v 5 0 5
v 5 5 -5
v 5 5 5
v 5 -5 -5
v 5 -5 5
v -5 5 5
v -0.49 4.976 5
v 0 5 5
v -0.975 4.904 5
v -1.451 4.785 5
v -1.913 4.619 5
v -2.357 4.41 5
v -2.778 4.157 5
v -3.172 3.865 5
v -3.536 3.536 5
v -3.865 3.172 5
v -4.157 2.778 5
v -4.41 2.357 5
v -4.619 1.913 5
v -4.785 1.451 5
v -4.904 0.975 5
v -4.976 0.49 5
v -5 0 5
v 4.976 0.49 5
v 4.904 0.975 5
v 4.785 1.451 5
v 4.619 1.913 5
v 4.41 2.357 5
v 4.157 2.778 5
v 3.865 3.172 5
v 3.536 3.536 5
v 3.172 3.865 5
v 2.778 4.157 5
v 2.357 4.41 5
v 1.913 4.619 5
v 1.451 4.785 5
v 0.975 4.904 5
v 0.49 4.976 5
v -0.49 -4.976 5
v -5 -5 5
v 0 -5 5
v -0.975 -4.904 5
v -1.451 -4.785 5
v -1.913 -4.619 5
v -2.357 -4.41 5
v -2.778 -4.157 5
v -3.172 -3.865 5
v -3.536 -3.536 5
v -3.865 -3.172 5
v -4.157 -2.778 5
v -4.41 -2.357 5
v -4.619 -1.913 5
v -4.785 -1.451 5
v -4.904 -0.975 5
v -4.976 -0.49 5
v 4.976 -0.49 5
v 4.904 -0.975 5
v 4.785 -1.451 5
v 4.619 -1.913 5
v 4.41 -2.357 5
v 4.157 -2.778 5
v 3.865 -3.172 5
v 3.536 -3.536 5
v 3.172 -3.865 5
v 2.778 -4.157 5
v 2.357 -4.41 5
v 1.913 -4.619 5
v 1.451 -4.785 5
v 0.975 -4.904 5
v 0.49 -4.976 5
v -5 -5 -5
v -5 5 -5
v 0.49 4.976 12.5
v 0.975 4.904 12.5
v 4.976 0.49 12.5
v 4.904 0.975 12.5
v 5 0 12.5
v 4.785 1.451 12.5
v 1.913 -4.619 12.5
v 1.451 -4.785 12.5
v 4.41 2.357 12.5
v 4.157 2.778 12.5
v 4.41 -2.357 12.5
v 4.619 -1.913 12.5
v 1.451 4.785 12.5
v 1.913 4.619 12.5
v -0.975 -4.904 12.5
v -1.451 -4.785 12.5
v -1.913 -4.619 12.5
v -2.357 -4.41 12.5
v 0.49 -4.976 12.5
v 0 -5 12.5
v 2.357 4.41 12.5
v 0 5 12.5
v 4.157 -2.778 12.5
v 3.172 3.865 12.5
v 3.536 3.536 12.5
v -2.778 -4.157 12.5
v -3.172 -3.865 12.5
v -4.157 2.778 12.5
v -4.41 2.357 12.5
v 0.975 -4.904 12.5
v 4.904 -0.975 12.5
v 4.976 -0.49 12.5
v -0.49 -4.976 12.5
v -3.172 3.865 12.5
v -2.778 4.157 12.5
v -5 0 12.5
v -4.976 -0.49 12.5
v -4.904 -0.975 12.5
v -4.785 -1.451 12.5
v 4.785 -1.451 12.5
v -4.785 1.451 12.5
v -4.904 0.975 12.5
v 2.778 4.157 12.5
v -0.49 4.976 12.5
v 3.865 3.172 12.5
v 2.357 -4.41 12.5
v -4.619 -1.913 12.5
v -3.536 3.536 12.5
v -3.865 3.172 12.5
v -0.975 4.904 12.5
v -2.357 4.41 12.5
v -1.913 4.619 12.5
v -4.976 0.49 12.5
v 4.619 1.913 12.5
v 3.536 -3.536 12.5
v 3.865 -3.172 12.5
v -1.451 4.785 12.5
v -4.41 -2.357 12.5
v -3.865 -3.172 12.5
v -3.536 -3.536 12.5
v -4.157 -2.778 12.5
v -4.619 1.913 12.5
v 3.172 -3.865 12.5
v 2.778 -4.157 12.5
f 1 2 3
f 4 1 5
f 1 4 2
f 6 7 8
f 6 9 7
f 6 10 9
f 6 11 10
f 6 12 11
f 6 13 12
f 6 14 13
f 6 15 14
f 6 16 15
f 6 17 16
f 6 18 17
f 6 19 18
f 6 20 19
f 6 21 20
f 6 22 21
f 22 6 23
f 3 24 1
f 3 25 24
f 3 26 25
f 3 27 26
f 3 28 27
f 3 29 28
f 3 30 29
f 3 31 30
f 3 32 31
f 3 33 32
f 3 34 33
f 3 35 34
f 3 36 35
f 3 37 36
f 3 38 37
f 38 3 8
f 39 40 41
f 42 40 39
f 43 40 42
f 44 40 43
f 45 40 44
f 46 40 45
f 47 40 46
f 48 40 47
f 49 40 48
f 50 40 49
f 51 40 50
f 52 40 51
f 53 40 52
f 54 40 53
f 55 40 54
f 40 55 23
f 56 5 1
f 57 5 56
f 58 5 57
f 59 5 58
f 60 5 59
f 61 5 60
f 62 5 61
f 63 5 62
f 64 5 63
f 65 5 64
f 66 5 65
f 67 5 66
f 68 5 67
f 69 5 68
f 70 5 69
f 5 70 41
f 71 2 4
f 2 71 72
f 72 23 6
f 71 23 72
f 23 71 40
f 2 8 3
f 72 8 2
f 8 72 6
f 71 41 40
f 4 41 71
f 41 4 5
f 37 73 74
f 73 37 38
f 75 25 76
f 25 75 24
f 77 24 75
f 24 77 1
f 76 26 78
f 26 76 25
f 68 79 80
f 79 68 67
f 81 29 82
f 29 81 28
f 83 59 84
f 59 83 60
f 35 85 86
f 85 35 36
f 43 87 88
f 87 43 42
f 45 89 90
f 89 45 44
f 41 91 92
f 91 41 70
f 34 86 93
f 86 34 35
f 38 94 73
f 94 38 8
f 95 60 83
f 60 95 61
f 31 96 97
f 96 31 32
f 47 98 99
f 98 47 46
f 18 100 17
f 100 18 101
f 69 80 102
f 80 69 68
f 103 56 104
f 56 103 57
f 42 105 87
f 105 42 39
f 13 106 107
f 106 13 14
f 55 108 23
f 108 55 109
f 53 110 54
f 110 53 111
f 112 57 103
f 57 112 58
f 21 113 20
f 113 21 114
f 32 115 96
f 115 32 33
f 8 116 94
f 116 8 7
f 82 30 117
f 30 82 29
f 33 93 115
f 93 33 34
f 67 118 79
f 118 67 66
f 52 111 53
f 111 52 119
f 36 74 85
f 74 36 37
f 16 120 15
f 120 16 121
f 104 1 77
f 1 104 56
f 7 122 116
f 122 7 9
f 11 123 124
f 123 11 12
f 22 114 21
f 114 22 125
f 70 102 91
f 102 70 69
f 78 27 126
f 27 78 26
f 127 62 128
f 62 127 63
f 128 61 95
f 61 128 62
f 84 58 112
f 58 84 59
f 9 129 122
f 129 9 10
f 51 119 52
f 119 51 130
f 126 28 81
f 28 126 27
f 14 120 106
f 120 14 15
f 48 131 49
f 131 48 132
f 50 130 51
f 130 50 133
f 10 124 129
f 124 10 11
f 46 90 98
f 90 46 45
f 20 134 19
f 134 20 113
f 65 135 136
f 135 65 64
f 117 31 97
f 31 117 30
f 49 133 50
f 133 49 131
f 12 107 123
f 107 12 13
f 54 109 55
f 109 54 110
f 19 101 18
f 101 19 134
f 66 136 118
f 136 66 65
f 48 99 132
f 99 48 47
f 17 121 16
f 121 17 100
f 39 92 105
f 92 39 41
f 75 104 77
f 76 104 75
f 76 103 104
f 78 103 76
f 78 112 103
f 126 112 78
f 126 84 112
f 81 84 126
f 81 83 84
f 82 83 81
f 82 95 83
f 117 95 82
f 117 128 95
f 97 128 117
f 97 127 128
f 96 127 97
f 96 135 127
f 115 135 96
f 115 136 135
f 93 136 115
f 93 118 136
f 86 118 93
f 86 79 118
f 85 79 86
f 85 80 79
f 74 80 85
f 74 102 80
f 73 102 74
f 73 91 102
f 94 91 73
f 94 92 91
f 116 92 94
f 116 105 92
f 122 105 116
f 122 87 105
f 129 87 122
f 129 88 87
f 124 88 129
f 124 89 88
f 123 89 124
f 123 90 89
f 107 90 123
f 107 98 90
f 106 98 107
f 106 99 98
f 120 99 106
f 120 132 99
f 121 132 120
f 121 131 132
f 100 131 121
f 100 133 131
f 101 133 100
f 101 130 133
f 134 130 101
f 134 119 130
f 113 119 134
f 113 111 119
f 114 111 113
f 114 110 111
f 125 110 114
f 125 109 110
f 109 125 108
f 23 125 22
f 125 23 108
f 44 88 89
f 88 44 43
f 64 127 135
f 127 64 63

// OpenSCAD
// Set fragment number for roundings
$fn = $preview ? 32 : 64;

// Size of the Cube (all directions)
cuSize = 10;

// The diameter of the Cylinder
cyDia = 10;

// The height of the Cylinder
cyHei = 15;

// Z-Translation of the Cylinder
tZ = 5;

// Create Cube and move Cylinder by 'tZ'
cube(size = [cuSize, cuSize, cuSize], center = true);
translate([0, 0, tZ])
    cylinder(d = cyDia, h = cyHei, center = true);
